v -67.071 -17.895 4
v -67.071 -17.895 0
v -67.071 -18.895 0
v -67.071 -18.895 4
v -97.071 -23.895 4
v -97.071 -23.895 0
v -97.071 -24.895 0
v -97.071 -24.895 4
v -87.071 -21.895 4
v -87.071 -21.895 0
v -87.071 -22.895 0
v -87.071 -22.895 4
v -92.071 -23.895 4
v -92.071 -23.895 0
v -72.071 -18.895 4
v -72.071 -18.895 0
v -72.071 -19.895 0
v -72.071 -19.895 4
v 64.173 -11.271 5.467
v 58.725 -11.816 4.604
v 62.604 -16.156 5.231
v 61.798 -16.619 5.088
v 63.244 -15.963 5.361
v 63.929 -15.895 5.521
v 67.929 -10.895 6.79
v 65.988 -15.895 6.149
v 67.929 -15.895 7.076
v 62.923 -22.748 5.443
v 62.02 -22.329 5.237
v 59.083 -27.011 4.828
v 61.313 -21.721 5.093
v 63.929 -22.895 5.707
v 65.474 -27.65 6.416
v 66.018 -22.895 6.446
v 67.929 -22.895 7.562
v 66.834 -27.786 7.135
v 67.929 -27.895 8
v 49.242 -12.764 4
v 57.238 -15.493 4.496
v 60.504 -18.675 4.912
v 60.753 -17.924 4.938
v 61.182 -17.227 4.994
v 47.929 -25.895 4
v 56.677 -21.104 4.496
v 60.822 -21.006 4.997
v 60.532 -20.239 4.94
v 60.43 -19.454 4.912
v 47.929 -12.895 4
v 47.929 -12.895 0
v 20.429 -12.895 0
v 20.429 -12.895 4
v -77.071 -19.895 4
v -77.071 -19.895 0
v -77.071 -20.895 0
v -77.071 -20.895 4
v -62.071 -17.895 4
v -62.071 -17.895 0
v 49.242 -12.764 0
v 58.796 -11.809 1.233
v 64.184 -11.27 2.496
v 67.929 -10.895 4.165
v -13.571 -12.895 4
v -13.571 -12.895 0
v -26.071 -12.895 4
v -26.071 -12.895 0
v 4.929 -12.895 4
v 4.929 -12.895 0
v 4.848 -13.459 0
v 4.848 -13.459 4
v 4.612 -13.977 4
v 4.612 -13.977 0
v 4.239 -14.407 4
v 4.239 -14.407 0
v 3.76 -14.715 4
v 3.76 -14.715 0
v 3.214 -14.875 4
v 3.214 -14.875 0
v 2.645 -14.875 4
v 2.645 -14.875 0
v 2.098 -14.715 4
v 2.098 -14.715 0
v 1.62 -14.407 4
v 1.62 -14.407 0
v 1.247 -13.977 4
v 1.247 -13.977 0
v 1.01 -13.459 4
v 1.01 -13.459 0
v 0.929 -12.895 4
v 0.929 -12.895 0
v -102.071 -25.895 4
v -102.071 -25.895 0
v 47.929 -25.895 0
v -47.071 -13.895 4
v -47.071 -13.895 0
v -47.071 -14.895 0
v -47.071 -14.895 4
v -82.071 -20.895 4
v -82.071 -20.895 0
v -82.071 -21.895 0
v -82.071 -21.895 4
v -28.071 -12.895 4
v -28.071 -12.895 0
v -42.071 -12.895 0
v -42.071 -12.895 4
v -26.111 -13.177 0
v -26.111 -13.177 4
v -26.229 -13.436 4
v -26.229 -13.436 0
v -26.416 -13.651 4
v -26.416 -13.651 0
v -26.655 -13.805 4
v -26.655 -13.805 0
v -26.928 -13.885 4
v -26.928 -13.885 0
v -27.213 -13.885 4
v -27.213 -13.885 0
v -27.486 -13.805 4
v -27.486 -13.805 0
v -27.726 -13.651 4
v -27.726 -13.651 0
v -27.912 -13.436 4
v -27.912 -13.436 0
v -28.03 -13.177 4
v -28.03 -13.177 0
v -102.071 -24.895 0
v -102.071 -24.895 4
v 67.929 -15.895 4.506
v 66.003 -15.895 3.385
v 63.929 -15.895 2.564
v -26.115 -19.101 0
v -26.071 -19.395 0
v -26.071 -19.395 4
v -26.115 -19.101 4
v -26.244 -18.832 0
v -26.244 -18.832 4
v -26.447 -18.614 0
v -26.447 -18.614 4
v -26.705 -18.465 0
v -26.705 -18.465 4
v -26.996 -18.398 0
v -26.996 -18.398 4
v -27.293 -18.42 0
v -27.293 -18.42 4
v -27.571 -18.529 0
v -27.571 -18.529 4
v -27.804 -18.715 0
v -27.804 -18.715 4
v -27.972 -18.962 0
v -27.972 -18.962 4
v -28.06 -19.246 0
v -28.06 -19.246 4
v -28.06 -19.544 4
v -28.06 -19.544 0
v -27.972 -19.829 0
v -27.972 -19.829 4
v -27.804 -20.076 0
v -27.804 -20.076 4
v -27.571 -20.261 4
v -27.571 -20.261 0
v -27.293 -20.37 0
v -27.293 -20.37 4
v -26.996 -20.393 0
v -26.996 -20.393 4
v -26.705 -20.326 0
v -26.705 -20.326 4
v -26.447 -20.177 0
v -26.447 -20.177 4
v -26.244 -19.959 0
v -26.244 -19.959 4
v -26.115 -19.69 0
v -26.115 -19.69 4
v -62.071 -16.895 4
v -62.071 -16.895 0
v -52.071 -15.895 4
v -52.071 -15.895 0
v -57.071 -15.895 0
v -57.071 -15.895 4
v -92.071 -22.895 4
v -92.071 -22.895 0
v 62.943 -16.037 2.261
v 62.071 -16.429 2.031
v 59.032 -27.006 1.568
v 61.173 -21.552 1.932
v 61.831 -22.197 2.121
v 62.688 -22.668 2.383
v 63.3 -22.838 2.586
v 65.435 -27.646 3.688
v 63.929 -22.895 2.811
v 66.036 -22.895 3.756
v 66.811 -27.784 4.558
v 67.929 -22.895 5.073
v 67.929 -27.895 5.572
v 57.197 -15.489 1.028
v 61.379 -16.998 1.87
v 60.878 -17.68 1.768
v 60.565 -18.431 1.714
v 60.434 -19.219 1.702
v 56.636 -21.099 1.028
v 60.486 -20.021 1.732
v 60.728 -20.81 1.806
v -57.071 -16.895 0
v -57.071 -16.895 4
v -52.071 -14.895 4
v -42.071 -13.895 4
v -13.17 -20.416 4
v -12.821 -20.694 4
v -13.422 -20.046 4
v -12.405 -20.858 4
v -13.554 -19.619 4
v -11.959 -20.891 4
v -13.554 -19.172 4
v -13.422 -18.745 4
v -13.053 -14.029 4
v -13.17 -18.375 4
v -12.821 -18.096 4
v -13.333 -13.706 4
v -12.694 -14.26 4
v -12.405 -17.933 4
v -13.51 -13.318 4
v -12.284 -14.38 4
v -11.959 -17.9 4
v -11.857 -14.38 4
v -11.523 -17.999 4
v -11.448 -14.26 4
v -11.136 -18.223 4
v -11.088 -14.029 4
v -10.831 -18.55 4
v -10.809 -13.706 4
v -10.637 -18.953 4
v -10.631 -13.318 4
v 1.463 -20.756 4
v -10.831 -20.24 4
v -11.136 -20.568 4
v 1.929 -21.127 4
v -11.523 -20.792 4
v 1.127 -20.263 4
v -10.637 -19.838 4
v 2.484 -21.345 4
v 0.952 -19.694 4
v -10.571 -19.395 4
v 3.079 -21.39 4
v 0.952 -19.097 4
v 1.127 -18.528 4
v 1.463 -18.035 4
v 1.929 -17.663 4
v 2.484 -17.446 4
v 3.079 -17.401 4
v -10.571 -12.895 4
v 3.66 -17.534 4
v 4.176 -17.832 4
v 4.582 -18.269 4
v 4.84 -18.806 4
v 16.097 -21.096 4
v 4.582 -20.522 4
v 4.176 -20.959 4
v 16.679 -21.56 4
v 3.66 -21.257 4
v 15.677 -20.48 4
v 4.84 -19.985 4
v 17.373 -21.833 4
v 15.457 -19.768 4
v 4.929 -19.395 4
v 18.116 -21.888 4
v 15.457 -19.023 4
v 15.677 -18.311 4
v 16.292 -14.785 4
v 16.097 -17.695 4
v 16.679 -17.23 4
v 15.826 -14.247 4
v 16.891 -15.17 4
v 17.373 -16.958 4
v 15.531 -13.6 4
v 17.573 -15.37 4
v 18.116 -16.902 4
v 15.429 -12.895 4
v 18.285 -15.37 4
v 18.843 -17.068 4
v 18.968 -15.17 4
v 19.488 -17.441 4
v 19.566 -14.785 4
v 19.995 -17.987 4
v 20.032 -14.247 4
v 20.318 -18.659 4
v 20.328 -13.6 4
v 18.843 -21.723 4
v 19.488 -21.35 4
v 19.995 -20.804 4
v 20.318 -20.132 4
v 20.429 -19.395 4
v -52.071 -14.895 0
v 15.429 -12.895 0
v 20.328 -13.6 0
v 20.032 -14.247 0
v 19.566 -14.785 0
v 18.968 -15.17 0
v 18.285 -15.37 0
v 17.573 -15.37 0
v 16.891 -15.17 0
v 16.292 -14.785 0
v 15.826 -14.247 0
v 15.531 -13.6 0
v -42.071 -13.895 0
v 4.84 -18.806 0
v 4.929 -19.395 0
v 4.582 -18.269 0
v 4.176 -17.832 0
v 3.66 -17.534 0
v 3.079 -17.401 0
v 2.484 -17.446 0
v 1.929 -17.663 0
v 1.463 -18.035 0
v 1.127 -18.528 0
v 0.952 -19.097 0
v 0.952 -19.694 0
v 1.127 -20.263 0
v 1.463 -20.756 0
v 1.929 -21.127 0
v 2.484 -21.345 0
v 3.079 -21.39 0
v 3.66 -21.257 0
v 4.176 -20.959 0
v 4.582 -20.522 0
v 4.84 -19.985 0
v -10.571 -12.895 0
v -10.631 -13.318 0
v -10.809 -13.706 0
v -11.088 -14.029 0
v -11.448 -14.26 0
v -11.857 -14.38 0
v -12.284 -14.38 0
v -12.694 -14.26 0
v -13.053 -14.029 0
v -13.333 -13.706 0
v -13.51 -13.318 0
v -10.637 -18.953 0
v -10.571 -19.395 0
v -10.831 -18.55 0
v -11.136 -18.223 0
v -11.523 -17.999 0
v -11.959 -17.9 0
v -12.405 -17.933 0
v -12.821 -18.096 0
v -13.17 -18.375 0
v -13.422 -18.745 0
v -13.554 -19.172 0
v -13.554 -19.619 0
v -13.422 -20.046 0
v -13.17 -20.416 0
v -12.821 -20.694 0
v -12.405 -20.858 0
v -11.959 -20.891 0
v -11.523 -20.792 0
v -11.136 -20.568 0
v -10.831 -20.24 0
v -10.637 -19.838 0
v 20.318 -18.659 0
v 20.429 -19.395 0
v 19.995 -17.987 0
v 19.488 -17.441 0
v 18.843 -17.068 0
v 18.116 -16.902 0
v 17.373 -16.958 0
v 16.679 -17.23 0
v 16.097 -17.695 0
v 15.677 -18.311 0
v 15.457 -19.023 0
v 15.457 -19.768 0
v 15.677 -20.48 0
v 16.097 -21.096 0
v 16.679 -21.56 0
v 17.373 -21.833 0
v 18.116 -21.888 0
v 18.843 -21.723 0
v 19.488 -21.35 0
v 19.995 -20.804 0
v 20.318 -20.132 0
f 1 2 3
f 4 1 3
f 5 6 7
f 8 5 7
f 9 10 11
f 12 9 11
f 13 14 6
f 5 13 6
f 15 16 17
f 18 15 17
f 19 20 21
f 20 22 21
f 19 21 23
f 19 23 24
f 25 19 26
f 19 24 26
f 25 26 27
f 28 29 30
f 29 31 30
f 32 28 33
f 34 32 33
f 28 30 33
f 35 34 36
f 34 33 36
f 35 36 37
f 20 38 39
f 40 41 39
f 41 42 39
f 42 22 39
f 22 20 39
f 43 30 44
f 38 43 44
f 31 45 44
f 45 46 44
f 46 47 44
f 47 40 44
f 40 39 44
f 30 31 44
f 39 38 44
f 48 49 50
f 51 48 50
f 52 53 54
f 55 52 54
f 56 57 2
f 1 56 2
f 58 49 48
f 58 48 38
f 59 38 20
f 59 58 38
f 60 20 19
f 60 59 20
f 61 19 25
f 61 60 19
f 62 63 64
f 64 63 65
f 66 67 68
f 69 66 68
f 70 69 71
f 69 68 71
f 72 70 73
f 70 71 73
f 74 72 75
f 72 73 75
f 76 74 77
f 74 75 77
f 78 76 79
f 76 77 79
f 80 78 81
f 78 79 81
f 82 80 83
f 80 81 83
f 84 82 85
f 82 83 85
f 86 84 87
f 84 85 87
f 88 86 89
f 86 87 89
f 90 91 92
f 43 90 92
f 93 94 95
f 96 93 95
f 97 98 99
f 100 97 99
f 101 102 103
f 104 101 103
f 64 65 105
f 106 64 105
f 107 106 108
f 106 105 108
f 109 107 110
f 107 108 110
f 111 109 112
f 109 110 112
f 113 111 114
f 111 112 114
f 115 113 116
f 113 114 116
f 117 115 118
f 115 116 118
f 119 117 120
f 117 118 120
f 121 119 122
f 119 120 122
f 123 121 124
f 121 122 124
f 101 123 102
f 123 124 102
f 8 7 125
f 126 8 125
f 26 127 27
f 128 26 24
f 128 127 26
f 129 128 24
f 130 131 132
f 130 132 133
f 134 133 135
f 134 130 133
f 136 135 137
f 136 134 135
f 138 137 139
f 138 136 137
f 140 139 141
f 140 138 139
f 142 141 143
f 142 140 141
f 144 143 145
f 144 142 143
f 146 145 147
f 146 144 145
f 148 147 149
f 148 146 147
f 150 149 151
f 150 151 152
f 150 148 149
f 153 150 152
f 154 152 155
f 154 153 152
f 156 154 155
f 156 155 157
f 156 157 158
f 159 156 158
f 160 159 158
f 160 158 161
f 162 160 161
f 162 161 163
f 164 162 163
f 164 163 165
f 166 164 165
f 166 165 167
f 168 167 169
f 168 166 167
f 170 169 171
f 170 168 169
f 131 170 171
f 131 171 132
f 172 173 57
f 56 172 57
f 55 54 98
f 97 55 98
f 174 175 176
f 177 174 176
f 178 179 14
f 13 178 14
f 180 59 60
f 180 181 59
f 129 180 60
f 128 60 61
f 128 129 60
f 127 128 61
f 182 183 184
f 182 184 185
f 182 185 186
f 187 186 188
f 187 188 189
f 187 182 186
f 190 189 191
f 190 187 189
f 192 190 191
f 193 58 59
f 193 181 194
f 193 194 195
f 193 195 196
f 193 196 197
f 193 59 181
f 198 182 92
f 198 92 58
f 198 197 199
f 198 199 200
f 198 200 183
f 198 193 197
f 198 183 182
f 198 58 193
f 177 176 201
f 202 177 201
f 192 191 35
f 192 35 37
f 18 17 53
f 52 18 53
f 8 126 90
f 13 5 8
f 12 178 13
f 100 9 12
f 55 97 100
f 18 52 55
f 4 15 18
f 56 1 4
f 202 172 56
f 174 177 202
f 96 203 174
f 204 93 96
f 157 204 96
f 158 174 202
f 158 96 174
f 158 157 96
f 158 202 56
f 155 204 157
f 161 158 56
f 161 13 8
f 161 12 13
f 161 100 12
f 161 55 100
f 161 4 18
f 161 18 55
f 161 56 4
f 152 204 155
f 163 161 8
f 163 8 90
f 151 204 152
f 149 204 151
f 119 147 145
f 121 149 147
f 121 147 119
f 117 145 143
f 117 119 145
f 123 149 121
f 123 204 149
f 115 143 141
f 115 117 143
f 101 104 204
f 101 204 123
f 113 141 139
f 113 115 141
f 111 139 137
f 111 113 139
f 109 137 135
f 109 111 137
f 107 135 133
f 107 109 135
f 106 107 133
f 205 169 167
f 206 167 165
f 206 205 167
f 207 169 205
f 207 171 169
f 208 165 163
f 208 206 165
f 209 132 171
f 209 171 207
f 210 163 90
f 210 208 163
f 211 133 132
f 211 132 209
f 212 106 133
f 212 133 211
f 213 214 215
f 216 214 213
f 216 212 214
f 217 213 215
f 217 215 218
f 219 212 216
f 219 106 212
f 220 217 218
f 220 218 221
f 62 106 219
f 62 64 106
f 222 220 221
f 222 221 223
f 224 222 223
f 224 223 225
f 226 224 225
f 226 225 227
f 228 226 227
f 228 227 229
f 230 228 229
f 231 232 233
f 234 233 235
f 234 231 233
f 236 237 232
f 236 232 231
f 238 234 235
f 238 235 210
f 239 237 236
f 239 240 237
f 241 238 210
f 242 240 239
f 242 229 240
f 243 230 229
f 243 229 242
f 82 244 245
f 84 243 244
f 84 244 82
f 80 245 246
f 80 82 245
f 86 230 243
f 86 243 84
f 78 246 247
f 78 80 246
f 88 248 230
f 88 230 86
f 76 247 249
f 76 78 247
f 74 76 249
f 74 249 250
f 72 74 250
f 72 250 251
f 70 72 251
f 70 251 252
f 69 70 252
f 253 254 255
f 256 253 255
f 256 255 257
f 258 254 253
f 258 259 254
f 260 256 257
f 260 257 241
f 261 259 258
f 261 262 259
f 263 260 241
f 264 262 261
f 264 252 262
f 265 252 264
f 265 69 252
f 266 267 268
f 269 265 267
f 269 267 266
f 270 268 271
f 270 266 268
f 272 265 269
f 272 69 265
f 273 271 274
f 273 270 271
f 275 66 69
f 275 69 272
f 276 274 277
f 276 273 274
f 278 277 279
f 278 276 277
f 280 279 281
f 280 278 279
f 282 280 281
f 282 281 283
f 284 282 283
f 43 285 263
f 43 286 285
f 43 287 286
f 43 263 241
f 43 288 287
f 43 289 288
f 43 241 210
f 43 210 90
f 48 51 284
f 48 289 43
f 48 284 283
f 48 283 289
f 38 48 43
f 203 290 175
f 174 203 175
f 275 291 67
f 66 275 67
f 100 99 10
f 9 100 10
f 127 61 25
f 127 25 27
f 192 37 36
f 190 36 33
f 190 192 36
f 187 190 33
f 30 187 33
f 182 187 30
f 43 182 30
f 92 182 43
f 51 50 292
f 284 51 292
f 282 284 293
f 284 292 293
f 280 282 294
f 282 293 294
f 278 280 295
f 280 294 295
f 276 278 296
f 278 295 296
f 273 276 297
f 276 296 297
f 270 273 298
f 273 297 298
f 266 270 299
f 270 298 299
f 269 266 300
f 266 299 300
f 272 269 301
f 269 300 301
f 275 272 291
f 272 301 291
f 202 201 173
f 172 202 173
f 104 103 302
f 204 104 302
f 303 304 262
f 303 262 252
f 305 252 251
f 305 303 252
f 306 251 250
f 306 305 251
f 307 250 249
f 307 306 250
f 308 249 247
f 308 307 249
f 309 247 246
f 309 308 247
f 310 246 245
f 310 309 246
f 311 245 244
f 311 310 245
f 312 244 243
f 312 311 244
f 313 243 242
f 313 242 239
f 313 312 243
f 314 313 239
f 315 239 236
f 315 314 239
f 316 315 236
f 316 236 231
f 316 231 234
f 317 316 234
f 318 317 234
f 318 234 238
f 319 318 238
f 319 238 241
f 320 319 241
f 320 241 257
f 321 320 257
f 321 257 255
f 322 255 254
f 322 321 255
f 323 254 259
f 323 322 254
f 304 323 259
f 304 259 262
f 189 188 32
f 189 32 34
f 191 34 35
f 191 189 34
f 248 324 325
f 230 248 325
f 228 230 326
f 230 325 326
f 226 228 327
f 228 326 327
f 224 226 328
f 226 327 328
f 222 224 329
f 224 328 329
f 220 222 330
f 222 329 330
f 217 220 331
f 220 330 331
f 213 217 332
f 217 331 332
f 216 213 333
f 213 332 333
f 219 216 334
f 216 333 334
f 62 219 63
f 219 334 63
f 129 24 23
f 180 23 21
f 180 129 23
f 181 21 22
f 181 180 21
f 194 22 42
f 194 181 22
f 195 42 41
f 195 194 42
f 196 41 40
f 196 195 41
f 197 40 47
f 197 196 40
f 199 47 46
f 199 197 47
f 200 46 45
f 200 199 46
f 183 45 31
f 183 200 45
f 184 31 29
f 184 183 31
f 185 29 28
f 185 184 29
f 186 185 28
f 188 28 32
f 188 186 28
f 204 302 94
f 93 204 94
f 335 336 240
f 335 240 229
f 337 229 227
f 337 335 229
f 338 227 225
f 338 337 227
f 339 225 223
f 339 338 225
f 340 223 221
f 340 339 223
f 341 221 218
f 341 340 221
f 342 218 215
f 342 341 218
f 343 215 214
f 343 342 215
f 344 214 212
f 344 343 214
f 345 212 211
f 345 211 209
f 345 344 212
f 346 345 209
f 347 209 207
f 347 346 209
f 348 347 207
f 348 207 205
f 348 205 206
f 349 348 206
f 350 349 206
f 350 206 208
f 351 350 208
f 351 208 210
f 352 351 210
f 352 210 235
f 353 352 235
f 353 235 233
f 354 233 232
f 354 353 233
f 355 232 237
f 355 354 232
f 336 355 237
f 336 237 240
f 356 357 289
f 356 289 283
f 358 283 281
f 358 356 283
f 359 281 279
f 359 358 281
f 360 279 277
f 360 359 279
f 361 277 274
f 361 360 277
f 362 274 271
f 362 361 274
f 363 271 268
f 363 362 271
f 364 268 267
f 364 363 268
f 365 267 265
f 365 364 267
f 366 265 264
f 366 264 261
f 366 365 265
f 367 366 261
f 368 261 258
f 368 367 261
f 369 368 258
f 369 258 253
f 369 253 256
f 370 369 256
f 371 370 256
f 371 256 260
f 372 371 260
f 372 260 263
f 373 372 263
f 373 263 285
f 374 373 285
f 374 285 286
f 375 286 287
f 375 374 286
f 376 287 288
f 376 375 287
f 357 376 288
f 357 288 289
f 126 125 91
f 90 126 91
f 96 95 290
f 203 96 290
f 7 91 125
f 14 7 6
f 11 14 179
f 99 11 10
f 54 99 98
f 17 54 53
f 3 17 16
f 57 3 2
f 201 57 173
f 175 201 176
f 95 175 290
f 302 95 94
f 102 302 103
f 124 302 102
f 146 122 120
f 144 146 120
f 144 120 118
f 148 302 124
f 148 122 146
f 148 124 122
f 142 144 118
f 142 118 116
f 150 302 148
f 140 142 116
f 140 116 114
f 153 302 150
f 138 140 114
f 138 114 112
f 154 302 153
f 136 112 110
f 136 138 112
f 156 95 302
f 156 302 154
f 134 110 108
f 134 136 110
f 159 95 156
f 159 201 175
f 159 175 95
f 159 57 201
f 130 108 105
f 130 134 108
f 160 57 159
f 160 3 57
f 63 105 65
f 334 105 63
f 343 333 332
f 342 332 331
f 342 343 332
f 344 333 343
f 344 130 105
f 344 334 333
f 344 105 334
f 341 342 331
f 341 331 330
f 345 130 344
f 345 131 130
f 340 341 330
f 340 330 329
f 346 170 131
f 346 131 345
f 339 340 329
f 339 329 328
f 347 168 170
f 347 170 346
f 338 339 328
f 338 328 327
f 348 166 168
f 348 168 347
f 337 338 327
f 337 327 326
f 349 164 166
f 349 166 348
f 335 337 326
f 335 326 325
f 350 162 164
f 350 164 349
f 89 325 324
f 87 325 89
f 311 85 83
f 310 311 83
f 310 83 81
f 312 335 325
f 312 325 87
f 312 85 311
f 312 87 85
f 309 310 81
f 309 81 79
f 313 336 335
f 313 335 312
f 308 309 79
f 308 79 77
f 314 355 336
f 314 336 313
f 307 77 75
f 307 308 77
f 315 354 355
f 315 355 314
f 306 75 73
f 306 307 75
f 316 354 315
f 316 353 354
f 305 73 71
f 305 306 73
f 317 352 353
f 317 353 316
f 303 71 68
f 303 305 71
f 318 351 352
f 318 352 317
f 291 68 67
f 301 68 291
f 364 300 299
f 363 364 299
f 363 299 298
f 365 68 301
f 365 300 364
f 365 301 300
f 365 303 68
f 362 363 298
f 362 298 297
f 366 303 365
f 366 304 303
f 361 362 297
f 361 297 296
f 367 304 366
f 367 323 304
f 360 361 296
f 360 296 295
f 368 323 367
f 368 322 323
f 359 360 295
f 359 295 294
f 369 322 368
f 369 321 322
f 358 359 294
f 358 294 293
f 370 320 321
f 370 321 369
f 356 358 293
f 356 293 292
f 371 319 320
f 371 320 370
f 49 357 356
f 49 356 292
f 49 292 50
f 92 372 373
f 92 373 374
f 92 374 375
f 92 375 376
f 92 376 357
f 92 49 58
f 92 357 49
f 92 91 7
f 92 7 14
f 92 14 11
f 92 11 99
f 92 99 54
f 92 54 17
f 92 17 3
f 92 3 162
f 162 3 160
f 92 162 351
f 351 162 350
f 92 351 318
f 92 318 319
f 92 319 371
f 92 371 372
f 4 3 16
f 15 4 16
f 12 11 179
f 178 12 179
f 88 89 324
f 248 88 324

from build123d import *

# Parameters (mm, degrees)
F0_R     = 1
F0_R_2   = 1.5
F0_R_3   = 2
F0_R_4   = 2.5
F1_DEPTH = 4
F3_DEPTH = 8
F5_DEPTH = 25


with BuildPart() as f1:
    # F0 (on Top) → F1 (new body)
    with BuildSketch(Plane.XY):
        with BuildLine():
            Line((-52.0707386732, -14.8954221606), (-52.0707386732, -15.8954221606))
            Line((-52.0707386732, -15.8954221606), (-57.0707386732, -15.8954221606))
            Line((-57.0707386732, -15.8954221606), (-57.0707386732, -16.8954221606))
            Line((-57.0707386732, -16.8954221606), (-62.0707386732, -16.8954221606))
            Line((-62.0707386732, -16.8954221606), (-62.0707386732, -17.8954221606))
            Line((-62.0707386732, -17.8954221606), (-67.0707386732, -17.8954221606))
            Line((-67.0707386732, -17.8954221606), (-67.0707386732, -18.8954221606))
            Line((-67.0707386732, -18.8954221606), (-72.0707386732, -18.8954221606))
            Line((-72.0707386732, -18.8954221606), (-72.0707386732, -19.8954221606))
            Line((-72.0707386732, -19.8954221606), (-77.0707386732, -19.8954221606))
            Line((-77.0707386732, -19.8954221606), (-77.0707386732, -20.8954221606))
            Line((-77.0707386732, -20.8954221606), (-82.0707386732, -20.8954221606))
            Line((-82.0707386732, -20.8954221606), (-82.0707386732, -21.8954221606))
            Line((-82.0707386732, -21.8954221606), (-87.0707386732, -21.8954221606))
            Line((-87.0707386732, -21.8954221606), (-87.0707386732, -22.8954221606))
            Line((-87.0707386732, -22.8954221606), (-92.0707386732, -22.8954221606))
            Line((-92.0707386732, -22.8954221606), (-92.0707386732, -23.8954221606))
            Line((-92.0707386732, -23.8954221606), (-97.0707386732, -23.8954221606))
            Line((-97.0707386732, -23.8954221606), (-97.0707386732, -24.8954221606))
            Line((-97.0707386732, -24.8954221606), (-102.0707386732, -24.8954221606))
            Line((-102.0707386732, -24.8954221606), (-102.0707386732, -25.8954221606))
            Line((-102.0707386732, -25.8954221606), (47.9292613268, -25.8954221606))
            Line((47.9292613268, -25.8954221606), (47.9292613268, -12.8954221606))
            Line((47.9292613268, -12.8954221606), (20.4292613268, -12.8954221606))
            ThreePointArc((20.4292613268, -12.8954221606), (17.9292613268, -15.3954221606), (15.4292613268, -12.8954221606))
            Line((15.4292613268, -12.8954221606), (4.9292613268, -12.8954221606))
            ThreePointArc((4.9292613268, -12.8954221606), (2.9292613268, -14.8954221606), (0.9292613268, -12.8954221606))
            Line((0.9292613268, -12.8954221606), (-10.5707386732, -12.8954221606))
            ThreePointArc((-10.5707386732, -12.8954221606), (-12.0707386732, -14.3954221606), (-13.5707386732, -12.8954221606))
            Line((-13.5707386732, -12.8954221606), (-26.0707386732, -12.8954221606))
            ThreePointArc((-26.0707386732, -12.8954221606), (-27.0707386732, -13.8954221606), (-28.0707386732, -12.8954221606))
            Line((-28.0707386732, -12.8954221606), (-42.0707386732, -12.8954221606))
            Line((-42.0707386732, -12.8954221606), (-42.0707386732, -13.8954221606))
            Line((-42.0707386732, -13.8954221606), (-47.0707386732, -13.8954221606))
            Line((-47.0707386732, -13.8954221606), (-47.0707386732, -14.8954221606))
            Line((-47.0707386732, -14.8954221606), (-52.0707386732, -14.8954221606))
        make_face()
        with Locations((-27.0707386732, -19.3954221606)):
            Circle(F0_R, mode=Mode.SUBTRACT)
        with Locations((-12.0707386732, -19.3954221606)):
            Circle(F0_R_2, mode=Mode.SUBTRACT)
        with Locations((2.9292613268, -19.3954221606)):
            Circle(F0_R_3, mode=Mode.SUBTRACT)
        with Locations((17.9292613268, -19.3954221606)):
            Circle(F0_R_4, mode=Mode.SUBTRACT)
    extrude(amount=F1_DEPTH)

    # F2 (on face) → F3 (join)
    with BuildSketch(Plane(origin=(0, 0, 0), x_dir=(1, 0, 0), z_dir=(0, 0, -1))):
        with BuildLine():
            Line((47.9292613268, 25.8954221606), (47.9292613268, 12.8954221606))
            Line((47.9292613268, 12.8954221606), (67.9292613268, 10.8954221606))
            Line((67.9292613268, 10.8954221606), (67.9292613268, 15.8954221606))
            Line((67.9292613268, 15.8954221606), (63.9292613268, 15.8954221606))
            ThreePointArc((63.9292613268, 15.8954221606), (60.4292613268, 19.3954221606), (63.9292613268, 22.8954221606))
            Line((63.9292613268, 22.8954221606), (67.9292613268, 22.8954221606))
            Line((67.9292613268, 22.8954221606), (67.9292613268, 27.8954221606))
            Line((67.9292613268, 27.8954221606), (47.9292613268, 25.8954221606))
        make_face()
    extrude(amount=-F3_DEPTH)

    # F4 (on face) → F5 (cut)
    with BuildSketch(Plane(origin=(-2.0893560424, -20.8935604237, 0), x_dir=(0.9950371902, -0.099503719, 0), z_dir=(-0.099503719, -0.9950371902, 0))):
        with BuildLine():
            Line((47.7105565369, 4), (50.2680883301, 4))
            Line((50.2680883301, 4), (50.2680883301, 8))
            Line((50.2680883301, 8), (70.3678395723, 8))
            add(Edge.make_bspline(
                [(70.3678395723, 8), (72.5567347198, 10.1579266461), (72.4264311984, 13.587186432), (72.296127677, 17.0164462179)],
                knots=[0.598533387, 0.598533387, 0.598533387, 0.598533387, 1, 1, 1, 1], degree=3))
            add(Edge.make_bspline(
                [(70.3678395723, 5.5720340461), (72.8712183365, 8.3489220533), (72.5836730067, 12.6826841356), (72.296127677, 17.0164462179)],
                knots=[0.5727584581, 0.5727584581, 0.5727584581, 0.5727584581, 1, 1, 1, 1], degree=3))
            Line((70.3678395723, 5.5720340461), (70.3678395723, 0))
            Line((70.3678395723, 0), (50.2680883301, 0))
            Line((50.2680883301, 0), (50.2680883301, -3.928697668))
            Line((50.2680883301, -3.928697668), (74.866913259, -3.928697668))
            Line((74.866913259, -3.928697668), (74.866913259, 19.5322930813))
            Line((74.866913259, 19.5322930813), (50.2680883301, 19.5322930813))
            Line((50.2680883301, 19.5322930813), (47.7105565369, 19.5322930813))
            Line((47.7105565369, 19.5322930813), (47.7105565369, 4))
        make_face()
        with BuildLine():
            Line((50.2680883301, 8), (50.2680883301, 4))
            add(Edge.make_bspline(
                [(50.2680883301, 4), (58.6862880108, 4.3914090203), (67.1044876915, 4.7828180407), (70.3678395723, 8)],
                knots=[0, 0, 0, 0, 0.598533387, 0.598533387, 0.598533387, 0.598533387], degree=3))
            Line((70.3678395723, 8), (50.2680883301, 8))
        make_face()
        with BuildLine():
            add(Edge.make_bspline(
                [(50.2680883301, 0), (58.6399537153, 0.9246740387), (67.0118191006, 1.8493480774), (70.3678395723, 5.5720340461)],
                knots=[0, 0, 0, 0, 0.5727584581, 0.5727584581, 0.5727584581, 0.5727584581], degree=3))
            Line((50.2680883301, 0), (70.3678395723, 0))
            Line((70.3678395723, 0), (70.3678395723, 5.5720340461))
        make_face()
    extrude(amount=-F5_DEPTH, mode=Mode.SUBTRACT)


solid = f1.part
